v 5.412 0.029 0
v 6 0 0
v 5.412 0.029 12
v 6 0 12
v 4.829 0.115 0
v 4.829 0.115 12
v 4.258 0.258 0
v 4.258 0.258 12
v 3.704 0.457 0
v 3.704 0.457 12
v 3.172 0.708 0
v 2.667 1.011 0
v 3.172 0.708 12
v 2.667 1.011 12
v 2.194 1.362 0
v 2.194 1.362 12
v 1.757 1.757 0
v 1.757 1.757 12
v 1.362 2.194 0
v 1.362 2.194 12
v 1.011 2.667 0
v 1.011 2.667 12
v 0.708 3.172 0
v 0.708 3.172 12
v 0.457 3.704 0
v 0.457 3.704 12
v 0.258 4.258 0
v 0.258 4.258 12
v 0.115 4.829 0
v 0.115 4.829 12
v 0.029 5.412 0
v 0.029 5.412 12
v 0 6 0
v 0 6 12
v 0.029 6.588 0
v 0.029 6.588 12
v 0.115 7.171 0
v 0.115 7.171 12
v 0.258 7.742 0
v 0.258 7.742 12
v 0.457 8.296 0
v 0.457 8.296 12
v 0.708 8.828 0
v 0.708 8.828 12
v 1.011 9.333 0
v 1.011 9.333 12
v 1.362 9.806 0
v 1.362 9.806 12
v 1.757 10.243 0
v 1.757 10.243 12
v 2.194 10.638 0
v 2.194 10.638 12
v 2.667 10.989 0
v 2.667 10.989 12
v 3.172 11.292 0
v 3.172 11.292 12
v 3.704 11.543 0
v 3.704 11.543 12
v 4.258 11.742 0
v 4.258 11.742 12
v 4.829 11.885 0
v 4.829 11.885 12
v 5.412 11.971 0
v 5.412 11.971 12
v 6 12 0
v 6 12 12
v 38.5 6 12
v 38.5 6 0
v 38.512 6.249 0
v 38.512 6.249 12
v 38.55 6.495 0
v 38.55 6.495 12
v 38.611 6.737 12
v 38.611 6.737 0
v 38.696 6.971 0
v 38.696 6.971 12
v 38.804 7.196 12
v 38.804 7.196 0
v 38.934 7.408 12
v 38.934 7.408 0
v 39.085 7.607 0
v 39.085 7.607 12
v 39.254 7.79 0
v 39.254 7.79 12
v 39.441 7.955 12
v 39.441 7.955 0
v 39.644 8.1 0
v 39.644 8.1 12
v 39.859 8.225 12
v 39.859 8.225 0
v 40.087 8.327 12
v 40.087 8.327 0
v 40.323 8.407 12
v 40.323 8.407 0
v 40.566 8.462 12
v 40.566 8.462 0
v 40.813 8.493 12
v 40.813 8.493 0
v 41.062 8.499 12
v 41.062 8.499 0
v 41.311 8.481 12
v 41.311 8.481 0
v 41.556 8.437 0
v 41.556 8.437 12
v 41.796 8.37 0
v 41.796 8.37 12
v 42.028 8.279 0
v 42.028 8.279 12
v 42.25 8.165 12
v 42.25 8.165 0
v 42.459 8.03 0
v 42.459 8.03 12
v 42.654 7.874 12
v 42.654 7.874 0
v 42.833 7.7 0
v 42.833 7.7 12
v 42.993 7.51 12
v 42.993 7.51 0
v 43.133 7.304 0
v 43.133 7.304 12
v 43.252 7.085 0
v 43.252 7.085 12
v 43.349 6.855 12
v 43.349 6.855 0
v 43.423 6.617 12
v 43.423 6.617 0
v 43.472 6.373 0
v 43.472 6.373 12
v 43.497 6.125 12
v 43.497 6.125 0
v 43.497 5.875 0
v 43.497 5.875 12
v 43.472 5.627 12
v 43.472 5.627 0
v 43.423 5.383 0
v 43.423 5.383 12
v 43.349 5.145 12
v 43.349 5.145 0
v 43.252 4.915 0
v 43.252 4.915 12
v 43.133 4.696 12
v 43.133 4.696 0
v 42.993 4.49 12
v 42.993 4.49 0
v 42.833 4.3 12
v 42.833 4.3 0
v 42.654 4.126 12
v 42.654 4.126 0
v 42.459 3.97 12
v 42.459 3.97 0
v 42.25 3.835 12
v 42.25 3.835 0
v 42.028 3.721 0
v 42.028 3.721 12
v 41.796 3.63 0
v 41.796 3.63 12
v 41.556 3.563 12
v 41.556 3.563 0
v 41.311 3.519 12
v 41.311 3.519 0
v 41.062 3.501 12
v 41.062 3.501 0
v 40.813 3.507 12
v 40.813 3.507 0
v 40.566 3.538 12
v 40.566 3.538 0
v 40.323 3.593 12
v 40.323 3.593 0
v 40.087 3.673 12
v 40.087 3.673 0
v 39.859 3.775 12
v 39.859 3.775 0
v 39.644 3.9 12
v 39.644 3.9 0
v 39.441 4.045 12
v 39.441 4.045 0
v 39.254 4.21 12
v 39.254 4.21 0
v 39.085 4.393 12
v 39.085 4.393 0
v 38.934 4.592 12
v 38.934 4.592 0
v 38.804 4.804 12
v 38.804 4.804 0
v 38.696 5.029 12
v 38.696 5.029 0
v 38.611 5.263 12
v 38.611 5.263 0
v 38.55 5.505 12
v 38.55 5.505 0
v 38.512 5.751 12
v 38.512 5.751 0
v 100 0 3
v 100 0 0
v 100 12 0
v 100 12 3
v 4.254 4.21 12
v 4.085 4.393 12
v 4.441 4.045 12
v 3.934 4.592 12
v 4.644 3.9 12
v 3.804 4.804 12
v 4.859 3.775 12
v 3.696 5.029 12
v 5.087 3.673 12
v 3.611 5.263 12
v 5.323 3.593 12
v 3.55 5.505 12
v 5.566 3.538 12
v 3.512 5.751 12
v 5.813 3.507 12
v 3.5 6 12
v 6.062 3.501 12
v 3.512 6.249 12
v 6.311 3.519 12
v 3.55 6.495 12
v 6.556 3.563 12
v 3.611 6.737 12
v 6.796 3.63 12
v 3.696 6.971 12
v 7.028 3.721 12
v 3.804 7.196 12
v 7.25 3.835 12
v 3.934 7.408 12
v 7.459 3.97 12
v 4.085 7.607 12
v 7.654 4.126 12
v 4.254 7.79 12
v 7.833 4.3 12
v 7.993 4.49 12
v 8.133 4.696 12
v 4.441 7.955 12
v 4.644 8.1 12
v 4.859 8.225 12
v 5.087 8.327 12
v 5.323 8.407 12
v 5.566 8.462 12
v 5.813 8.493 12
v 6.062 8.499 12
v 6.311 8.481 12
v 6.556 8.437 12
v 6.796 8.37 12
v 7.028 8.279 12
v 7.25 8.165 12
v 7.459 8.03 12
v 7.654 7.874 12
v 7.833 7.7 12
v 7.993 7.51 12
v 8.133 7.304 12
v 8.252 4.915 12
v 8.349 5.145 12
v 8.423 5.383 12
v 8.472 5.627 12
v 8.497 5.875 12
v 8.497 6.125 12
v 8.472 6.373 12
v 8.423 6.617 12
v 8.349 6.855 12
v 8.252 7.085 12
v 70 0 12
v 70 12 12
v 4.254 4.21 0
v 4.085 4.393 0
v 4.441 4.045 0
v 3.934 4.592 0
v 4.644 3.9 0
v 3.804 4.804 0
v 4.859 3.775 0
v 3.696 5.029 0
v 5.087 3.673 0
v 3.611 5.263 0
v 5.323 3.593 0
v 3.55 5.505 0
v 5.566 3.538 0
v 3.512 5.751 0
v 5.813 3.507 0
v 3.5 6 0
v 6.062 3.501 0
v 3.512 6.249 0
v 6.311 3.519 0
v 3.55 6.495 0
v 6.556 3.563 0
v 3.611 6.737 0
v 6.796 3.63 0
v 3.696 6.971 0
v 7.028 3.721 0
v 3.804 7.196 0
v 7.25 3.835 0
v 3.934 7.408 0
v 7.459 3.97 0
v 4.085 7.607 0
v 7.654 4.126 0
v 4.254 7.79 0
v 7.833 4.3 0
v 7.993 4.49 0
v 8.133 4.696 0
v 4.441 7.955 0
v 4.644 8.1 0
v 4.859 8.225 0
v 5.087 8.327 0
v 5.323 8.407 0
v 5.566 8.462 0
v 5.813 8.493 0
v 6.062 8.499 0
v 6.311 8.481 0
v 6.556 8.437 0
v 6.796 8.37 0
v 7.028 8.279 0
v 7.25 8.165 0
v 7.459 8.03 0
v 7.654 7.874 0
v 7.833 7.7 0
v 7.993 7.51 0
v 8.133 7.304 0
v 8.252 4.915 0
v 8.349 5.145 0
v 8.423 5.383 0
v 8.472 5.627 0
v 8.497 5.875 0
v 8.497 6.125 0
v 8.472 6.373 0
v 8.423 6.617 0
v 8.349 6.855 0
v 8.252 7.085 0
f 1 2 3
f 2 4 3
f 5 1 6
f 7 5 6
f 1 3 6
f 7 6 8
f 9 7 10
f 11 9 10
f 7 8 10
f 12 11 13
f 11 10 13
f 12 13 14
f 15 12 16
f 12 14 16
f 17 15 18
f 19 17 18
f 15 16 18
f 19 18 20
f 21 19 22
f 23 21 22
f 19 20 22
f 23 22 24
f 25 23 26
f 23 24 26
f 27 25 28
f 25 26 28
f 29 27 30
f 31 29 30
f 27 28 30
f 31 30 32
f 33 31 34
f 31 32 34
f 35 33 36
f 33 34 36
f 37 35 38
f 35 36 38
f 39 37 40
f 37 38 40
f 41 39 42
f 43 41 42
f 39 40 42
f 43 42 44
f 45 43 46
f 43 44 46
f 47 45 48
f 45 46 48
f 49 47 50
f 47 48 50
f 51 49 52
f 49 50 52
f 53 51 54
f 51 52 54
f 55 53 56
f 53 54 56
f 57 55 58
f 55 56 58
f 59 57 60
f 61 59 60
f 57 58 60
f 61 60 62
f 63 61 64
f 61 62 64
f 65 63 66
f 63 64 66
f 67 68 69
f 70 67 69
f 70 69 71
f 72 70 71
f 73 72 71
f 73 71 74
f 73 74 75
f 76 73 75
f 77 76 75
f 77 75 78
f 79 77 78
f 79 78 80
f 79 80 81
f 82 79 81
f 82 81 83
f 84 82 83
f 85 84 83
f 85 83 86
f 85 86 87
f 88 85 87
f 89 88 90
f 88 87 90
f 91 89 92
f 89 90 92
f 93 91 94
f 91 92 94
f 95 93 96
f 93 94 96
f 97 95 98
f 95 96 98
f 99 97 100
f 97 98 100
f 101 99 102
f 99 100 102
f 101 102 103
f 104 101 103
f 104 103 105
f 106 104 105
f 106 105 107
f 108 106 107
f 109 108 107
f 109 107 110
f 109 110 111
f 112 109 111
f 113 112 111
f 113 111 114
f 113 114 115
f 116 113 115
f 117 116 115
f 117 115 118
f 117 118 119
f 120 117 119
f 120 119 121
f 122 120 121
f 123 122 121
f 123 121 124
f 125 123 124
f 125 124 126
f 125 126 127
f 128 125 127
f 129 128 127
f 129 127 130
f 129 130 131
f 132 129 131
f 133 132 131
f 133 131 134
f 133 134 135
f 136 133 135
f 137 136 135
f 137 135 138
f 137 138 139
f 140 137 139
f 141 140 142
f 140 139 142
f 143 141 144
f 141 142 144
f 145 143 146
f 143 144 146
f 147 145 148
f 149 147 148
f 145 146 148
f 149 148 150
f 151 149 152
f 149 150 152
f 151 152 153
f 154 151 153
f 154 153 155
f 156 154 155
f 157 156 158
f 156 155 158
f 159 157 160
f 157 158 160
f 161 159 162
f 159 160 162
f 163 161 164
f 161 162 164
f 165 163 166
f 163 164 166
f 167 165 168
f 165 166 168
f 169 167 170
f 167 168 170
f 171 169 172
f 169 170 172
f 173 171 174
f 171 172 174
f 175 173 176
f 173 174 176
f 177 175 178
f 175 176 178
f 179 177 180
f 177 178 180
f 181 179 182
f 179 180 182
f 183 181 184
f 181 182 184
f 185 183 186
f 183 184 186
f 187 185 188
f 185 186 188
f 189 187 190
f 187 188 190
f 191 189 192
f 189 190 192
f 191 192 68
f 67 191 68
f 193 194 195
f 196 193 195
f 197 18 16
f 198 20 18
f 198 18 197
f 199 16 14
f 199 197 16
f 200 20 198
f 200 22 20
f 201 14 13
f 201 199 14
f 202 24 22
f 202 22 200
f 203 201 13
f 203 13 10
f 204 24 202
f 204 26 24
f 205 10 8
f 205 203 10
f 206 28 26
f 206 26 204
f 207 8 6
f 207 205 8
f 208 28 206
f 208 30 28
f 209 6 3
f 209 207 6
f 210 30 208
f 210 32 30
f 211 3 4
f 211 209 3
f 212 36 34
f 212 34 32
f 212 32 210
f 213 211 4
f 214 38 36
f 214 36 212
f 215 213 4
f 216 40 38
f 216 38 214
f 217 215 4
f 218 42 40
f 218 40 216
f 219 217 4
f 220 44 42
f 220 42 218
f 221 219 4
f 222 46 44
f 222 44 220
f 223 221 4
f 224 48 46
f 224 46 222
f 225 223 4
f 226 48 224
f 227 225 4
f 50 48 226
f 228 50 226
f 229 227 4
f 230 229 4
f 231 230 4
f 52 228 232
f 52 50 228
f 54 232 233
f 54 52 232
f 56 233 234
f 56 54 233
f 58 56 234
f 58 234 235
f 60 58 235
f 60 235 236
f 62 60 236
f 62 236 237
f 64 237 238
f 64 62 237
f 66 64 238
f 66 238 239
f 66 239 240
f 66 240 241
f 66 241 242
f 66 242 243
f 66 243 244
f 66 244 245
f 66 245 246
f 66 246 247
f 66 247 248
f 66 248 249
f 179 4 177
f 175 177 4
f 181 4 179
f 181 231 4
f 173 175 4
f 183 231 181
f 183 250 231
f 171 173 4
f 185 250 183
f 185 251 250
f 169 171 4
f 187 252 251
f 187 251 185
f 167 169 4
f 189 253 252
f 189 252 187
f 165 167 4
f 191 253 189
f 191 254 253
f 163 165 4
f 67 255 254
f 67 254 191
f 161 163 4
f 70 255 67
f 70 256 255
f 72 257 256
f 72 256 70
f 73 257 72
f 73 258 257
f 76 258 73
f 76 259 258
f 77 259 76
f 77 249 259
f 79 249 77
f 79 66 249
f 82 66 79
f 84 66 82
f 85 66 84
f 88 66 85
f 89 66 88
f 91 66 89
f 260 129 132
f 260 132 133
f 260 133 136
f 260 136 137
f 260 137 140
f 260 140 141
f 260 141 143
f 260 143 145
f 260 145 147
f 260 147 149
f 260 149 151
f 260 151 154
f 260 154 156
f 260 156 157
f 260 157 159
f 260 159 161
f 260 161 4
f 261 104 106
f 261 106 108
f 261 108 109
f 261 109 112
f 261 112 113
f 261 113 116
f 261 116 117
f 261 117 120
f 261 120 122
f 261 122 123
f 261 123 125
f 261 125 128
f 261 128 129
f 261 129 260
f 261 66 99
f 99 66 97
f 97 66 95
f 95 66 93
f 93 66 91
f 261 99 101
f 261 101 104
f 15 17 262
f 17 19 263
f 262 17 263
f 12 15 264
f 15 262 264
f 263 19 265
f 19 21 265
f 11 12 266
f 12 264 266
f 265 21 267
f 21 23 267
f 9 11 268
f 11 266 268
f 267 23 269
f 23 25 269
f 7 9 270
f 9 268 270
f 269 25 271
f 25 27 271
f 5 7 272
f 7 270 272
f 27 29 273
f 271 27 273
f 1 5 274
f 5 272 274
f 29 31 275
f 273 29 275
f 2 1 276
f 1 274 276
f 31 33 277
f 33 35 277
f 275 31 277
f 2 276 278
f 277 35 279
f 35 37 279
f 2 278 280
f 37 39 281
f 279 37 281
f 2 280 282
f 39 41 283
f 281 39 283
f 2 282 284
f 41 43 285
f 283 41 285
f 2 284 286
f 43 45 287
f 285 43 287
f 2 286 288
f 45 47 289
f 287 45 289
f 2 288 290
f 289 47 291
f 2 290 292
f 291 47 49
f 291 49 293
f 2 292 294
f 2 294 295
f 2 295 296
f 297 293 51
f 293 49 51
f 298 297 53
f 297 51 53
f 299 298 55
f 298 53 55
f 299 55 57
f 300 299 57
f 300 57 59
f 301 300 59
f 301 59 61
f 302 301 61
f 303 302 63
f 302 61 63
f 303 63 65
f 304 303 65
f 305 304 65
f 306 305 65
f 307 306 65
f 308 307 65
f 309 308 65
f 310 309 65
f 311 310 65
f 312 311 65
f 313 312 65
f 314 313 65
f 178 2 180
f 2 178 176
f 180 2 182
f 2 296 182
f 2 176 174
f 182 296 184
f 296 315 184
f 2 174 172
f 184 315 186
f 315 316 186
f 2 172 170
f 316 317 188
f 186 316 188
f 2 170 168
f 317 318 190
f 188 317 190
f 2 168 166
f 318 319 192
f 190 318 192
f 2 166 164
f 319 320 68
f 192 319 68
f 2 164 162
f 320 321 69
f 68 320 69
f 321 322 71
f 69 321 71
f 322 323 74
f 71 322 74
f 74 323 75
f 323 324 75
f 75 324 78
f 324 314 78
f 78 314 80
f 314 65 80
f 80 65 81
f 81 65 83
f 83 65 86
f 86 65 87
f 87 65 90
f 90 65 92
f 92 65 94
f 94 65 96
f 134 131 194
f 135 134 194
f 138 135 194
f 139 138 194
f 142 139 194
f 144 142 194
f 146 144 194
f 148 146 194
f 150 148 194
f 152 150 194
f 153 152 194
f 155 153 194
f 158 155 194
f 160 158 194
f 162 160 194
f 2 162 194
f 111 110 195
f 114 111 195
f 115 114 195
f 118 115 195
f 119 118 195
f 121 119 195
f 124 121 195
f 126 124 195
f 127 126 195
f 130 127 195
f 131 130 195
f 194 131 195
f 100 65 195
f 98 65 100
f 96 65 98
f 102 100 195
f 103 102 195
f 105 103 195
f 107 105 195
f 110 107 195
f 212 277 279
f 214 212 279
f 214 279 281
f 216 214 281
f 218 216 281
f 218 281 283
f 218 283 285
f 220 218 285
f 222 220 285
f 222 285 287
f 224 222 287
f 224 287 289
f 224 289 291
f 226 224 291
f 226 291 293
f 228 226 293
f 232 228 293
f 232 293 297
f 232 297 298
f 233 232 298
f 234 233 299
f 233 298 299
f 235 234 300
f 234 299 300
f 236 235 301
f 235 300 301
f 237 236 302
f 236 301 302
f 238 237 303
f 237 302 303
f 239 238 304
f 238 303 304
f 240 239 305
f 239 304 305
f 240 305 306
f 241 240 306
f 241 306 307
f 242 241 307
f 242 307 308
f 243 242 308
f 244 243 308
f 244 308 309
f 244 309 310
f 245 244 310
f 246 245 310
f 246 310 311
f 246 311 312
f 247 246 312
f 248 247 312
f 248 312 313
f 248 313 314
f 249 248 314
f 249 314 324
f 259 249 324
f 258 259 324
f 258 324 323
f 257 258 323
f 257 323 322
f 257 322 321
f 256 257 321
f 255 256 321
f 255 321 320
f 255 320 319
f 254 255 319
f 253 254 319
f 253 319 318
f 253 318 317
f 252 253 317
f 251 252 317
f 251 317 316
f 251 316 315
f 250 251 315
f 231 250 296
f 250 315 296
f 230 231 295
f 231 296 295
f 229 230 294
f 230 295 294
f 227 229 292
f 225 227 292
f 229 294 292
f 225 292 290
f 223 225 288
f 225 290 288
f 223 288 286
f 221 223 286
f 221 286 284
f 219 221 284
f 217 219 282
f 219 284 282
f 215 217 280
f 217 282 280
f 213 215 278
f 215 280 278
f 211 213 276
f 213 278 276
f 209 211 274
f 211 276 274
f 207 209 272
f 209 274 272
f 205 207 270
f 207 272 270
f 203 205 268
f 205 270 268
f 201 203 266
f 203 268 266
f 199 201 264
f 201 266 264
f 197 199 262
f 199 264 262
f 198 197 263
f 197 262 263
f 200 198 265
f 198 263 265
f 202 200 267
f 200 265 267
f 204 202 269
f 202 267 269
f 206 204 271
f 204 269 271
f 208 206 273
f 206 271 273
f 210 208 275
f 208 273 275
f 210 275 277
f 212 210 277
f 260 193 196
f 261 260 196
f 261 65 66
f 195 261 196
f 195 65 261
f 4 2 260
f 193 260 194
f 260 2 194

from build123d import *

# Parameters (mm, degrees)
F0_W     = 100
F0_H     = 12
F1_DEPTH = 12
F2_SIZE2 = 9
F2_SIZE  = 30
F3_R     = 5.99999
F5_D     = 5


# Not quite as in the source:
# - a fillet or chamfer is up to 0.001 mm smaller than in the source, because OpenCascade refuses the exact size


with BuildPart() as f1:
    # F0 (on Top) → F1 (new body)
    with BuildSketch(Plane.XY):
        with Locations((50, 6)):
            Rectangle(F0_W, F0_H)
    extrude(amount=F1_DEPTH)

    # F2
    f2_edges = [f1.edges().sort_by_distance(p)[0] for p in [
        (100, 6, 12),
    ]]
    f2_side = f1.faces().sort_by_distance((50, 6, 12))[0]
    chamfer(f2_edges, length=F2_SIZE, length2=F2_SIZE2, reference=f2_side)

    # F3 (radius 6 in the source; OpenCascade refuses exactly that, so slightly less here)
    f3_edges = [f1.edges().sort_by_distance(p)[0] for p in [
        (0, 0, 6),
        (0, 12, 6),
    ]]
    fillet(f3_edges, radius=F3_R)

    # F5 (through all)
    with Locations(Plane.XY.offset(12)):
        with Locations((6, 6), (41, 6)):
            Hole(F5_D / 2)


solid = f1.part
